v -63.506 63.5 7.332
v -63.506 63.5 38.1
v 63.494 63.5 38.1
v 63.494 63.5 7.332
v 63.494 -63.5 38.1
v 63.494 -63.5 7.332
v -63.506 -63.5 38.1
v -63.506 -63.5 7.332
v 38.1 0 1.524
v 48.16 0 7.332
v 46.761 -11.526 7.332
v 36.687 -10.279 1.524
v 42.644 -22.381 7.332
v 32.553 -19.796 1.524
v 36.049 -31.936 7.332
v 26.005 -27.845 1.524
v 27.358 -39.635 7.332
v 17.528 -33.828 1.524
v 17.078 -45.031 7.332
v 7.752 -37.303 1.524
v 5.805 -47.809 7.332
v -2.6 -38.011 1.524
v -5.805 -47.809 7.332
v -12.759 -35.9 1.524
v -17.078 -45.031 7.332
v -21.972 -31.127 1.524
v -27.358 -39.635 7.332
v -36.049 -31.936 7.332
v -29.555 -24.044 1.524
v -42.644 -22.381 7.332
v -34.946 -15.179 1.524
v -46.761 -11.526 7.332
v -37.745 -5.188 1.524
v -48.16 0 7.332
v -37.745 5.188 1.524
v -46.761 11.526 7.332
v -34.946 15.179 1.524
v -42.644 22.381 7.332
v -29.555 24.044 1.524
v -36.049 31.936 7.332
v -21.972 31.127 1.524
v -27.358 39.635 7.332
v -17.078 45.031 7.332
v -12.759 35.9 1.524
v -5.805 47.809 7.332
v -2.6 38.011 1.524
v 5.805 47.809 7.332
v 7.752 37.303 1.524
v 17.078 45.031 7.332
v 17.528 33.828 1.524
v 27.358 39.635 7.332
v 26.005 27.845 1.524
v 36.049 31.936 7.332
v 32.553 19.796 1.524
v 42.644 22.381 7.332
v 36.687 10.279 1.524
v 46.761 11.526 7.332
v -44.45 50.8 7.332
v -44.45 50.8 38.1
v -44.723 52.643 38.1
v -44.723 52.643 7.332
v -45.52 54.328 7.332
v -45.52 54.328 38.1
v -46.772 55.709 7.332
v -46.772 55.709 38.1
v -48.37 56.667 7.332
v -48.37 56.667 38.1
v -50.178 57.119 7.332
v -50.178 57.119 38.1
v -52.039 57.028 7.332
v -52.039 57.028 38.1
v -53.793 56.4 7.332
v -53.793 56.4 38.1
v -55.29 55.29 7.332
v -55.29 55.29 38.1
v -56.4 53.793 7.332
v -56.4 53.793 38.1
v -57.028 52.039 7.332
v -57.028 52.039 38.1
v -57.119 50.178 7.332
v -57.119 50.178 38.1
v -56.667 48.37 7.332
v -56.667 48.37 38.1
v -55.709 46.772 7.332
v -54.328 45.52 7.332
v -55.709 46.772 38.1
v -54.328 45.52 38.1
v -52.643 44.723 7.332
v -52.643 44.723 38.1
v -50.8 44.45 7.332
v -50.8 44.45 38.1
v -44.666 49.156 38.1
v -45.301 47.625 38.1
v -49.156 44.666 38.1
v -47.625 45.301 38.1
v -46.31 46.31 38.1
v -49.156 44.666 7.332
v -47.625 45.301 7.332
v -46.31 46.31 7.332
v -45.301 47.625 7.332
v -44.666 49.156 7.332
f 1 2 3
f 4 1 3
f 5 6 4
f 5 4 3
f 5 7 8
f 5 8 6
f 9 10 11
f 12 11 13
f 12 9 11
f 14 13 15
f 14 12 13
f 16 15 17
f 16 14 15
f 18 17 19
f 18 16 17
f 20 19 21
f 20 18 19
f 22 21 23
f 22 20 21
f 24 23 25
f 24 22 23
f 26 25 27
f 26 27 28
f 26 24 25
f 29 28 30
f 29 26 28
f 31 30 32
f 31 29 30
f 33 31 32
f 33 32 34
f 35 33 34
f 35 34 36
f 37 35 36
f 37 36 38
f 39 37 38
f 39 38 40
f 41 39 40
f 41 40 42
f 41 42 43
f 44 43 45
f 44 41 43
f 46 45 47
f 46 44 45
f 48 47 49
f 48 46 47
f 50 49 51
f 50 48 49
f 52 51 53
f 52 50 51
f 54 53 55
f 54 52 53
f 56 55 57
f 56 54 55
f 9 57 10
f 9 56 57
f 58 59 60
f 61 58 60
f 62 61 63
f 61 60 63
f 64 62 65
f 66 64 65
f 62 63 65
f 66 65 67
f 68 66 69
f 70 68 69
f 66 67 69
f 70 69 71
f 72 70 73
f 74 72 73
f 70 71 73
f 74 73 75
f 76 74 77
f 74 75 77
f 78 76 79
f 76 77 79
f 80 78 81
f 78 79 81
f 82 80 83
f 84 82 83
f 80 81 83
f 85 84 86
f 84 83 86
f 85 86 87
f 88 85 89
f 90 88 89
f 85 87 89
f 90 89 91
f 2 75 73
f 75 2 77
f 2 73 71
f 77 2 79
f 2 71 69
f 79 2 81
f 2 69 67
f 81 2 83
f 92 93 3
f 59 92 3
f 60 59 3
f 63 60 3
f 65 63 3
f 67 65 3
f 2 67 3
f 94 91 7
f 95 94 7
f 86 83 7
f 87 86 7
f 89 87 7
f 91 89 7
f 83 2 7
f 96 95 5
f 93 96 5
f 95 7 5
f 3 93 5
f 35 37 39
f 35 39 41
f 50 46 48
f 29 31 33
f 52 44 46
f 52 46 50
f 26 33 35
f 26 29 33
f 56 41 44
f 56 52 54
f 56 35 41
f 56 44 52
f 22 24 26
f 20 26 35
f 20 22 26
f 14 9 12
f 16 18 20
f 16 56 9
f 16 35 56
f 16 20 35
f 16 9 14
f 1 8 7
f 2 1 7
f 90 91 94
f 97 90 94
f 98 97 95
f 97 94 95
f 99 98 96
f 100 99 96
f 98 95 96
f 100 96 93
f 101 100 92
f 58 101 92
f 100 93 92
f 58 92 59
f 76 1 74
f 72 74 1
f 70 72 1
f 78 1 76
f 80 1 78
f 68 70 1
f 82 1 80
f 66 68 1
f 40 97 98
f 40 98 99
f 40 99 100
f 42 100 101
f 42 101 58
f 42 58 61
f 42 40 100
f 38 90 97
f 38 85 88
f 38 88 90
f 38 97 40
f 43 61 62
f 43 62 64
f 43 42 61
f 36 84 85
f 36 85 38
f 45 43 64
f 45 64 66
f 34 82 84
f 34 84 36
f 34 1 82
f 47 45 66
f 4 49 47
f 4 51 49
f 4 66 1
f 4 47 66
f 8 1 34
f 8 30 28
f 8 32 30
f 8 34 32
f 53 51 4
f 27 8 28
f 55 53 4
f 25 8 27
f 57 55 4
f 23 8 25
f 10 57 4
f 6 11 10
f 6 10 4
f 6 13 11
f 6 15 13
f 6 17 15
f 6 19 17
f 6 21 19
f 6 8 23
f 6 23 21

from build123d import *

# Parameters (mm, degrees)
F1_W     = 127
F1_H     = 38.1
F2_DEPTH = 63.5
F5_DEPTH = 50.8


with BuildPart() as f2:
    # F1 (on Front) → F2 (new body, symmetric)
    with BuildSketch(Plane.XZ):
        with Locations((-0.005746, 19.05)):
            Rectangle(F1_W, F1_H)
    extrude(amount=F2_DEPTH, both=True)

    # F0 (on Front) → F3 (revolve, cut)
    with BuildSketch(Plane.XZ):
        Polygon((48.160355, 7.332348), (38.1, 1.524), (0, 1.524), (0, 0), (92.567263, 0), (92.567263, 7.332348), align=None)
    revolve(axis=Axis((0, 0, 0.762), (0, 0, -1)), mode=Mode.SUBTRACT)

    # F4 (on Top) → F5 (cut, symmetric)
    with BuildSketch(Plane.XY):
        with BuildLine():
            Line((-50.8, 44.45), (-50.8, 50.8))
            Line((-50.8, 50.8), (-44.45, 50.8))
            ThreePointArc((-44.45, 50.8), (-55.290128, 55.290128), (-50.8, 44.45))
        make_face()
        with BuildLine():
            Line((-44.45, 50.8), (-50.8, 50.8))
            Line((-50.8, 50.8), (-50.8, 44.45))
            ThreePointArc((-50.8, 44.45), (-46.309872, 46.309872), (-44.45, 50.8))
        make_face()
    extrude(amount=F5_DEPTH, both=True, mode=Mode.SUBTRACT)


solid = f2.part
